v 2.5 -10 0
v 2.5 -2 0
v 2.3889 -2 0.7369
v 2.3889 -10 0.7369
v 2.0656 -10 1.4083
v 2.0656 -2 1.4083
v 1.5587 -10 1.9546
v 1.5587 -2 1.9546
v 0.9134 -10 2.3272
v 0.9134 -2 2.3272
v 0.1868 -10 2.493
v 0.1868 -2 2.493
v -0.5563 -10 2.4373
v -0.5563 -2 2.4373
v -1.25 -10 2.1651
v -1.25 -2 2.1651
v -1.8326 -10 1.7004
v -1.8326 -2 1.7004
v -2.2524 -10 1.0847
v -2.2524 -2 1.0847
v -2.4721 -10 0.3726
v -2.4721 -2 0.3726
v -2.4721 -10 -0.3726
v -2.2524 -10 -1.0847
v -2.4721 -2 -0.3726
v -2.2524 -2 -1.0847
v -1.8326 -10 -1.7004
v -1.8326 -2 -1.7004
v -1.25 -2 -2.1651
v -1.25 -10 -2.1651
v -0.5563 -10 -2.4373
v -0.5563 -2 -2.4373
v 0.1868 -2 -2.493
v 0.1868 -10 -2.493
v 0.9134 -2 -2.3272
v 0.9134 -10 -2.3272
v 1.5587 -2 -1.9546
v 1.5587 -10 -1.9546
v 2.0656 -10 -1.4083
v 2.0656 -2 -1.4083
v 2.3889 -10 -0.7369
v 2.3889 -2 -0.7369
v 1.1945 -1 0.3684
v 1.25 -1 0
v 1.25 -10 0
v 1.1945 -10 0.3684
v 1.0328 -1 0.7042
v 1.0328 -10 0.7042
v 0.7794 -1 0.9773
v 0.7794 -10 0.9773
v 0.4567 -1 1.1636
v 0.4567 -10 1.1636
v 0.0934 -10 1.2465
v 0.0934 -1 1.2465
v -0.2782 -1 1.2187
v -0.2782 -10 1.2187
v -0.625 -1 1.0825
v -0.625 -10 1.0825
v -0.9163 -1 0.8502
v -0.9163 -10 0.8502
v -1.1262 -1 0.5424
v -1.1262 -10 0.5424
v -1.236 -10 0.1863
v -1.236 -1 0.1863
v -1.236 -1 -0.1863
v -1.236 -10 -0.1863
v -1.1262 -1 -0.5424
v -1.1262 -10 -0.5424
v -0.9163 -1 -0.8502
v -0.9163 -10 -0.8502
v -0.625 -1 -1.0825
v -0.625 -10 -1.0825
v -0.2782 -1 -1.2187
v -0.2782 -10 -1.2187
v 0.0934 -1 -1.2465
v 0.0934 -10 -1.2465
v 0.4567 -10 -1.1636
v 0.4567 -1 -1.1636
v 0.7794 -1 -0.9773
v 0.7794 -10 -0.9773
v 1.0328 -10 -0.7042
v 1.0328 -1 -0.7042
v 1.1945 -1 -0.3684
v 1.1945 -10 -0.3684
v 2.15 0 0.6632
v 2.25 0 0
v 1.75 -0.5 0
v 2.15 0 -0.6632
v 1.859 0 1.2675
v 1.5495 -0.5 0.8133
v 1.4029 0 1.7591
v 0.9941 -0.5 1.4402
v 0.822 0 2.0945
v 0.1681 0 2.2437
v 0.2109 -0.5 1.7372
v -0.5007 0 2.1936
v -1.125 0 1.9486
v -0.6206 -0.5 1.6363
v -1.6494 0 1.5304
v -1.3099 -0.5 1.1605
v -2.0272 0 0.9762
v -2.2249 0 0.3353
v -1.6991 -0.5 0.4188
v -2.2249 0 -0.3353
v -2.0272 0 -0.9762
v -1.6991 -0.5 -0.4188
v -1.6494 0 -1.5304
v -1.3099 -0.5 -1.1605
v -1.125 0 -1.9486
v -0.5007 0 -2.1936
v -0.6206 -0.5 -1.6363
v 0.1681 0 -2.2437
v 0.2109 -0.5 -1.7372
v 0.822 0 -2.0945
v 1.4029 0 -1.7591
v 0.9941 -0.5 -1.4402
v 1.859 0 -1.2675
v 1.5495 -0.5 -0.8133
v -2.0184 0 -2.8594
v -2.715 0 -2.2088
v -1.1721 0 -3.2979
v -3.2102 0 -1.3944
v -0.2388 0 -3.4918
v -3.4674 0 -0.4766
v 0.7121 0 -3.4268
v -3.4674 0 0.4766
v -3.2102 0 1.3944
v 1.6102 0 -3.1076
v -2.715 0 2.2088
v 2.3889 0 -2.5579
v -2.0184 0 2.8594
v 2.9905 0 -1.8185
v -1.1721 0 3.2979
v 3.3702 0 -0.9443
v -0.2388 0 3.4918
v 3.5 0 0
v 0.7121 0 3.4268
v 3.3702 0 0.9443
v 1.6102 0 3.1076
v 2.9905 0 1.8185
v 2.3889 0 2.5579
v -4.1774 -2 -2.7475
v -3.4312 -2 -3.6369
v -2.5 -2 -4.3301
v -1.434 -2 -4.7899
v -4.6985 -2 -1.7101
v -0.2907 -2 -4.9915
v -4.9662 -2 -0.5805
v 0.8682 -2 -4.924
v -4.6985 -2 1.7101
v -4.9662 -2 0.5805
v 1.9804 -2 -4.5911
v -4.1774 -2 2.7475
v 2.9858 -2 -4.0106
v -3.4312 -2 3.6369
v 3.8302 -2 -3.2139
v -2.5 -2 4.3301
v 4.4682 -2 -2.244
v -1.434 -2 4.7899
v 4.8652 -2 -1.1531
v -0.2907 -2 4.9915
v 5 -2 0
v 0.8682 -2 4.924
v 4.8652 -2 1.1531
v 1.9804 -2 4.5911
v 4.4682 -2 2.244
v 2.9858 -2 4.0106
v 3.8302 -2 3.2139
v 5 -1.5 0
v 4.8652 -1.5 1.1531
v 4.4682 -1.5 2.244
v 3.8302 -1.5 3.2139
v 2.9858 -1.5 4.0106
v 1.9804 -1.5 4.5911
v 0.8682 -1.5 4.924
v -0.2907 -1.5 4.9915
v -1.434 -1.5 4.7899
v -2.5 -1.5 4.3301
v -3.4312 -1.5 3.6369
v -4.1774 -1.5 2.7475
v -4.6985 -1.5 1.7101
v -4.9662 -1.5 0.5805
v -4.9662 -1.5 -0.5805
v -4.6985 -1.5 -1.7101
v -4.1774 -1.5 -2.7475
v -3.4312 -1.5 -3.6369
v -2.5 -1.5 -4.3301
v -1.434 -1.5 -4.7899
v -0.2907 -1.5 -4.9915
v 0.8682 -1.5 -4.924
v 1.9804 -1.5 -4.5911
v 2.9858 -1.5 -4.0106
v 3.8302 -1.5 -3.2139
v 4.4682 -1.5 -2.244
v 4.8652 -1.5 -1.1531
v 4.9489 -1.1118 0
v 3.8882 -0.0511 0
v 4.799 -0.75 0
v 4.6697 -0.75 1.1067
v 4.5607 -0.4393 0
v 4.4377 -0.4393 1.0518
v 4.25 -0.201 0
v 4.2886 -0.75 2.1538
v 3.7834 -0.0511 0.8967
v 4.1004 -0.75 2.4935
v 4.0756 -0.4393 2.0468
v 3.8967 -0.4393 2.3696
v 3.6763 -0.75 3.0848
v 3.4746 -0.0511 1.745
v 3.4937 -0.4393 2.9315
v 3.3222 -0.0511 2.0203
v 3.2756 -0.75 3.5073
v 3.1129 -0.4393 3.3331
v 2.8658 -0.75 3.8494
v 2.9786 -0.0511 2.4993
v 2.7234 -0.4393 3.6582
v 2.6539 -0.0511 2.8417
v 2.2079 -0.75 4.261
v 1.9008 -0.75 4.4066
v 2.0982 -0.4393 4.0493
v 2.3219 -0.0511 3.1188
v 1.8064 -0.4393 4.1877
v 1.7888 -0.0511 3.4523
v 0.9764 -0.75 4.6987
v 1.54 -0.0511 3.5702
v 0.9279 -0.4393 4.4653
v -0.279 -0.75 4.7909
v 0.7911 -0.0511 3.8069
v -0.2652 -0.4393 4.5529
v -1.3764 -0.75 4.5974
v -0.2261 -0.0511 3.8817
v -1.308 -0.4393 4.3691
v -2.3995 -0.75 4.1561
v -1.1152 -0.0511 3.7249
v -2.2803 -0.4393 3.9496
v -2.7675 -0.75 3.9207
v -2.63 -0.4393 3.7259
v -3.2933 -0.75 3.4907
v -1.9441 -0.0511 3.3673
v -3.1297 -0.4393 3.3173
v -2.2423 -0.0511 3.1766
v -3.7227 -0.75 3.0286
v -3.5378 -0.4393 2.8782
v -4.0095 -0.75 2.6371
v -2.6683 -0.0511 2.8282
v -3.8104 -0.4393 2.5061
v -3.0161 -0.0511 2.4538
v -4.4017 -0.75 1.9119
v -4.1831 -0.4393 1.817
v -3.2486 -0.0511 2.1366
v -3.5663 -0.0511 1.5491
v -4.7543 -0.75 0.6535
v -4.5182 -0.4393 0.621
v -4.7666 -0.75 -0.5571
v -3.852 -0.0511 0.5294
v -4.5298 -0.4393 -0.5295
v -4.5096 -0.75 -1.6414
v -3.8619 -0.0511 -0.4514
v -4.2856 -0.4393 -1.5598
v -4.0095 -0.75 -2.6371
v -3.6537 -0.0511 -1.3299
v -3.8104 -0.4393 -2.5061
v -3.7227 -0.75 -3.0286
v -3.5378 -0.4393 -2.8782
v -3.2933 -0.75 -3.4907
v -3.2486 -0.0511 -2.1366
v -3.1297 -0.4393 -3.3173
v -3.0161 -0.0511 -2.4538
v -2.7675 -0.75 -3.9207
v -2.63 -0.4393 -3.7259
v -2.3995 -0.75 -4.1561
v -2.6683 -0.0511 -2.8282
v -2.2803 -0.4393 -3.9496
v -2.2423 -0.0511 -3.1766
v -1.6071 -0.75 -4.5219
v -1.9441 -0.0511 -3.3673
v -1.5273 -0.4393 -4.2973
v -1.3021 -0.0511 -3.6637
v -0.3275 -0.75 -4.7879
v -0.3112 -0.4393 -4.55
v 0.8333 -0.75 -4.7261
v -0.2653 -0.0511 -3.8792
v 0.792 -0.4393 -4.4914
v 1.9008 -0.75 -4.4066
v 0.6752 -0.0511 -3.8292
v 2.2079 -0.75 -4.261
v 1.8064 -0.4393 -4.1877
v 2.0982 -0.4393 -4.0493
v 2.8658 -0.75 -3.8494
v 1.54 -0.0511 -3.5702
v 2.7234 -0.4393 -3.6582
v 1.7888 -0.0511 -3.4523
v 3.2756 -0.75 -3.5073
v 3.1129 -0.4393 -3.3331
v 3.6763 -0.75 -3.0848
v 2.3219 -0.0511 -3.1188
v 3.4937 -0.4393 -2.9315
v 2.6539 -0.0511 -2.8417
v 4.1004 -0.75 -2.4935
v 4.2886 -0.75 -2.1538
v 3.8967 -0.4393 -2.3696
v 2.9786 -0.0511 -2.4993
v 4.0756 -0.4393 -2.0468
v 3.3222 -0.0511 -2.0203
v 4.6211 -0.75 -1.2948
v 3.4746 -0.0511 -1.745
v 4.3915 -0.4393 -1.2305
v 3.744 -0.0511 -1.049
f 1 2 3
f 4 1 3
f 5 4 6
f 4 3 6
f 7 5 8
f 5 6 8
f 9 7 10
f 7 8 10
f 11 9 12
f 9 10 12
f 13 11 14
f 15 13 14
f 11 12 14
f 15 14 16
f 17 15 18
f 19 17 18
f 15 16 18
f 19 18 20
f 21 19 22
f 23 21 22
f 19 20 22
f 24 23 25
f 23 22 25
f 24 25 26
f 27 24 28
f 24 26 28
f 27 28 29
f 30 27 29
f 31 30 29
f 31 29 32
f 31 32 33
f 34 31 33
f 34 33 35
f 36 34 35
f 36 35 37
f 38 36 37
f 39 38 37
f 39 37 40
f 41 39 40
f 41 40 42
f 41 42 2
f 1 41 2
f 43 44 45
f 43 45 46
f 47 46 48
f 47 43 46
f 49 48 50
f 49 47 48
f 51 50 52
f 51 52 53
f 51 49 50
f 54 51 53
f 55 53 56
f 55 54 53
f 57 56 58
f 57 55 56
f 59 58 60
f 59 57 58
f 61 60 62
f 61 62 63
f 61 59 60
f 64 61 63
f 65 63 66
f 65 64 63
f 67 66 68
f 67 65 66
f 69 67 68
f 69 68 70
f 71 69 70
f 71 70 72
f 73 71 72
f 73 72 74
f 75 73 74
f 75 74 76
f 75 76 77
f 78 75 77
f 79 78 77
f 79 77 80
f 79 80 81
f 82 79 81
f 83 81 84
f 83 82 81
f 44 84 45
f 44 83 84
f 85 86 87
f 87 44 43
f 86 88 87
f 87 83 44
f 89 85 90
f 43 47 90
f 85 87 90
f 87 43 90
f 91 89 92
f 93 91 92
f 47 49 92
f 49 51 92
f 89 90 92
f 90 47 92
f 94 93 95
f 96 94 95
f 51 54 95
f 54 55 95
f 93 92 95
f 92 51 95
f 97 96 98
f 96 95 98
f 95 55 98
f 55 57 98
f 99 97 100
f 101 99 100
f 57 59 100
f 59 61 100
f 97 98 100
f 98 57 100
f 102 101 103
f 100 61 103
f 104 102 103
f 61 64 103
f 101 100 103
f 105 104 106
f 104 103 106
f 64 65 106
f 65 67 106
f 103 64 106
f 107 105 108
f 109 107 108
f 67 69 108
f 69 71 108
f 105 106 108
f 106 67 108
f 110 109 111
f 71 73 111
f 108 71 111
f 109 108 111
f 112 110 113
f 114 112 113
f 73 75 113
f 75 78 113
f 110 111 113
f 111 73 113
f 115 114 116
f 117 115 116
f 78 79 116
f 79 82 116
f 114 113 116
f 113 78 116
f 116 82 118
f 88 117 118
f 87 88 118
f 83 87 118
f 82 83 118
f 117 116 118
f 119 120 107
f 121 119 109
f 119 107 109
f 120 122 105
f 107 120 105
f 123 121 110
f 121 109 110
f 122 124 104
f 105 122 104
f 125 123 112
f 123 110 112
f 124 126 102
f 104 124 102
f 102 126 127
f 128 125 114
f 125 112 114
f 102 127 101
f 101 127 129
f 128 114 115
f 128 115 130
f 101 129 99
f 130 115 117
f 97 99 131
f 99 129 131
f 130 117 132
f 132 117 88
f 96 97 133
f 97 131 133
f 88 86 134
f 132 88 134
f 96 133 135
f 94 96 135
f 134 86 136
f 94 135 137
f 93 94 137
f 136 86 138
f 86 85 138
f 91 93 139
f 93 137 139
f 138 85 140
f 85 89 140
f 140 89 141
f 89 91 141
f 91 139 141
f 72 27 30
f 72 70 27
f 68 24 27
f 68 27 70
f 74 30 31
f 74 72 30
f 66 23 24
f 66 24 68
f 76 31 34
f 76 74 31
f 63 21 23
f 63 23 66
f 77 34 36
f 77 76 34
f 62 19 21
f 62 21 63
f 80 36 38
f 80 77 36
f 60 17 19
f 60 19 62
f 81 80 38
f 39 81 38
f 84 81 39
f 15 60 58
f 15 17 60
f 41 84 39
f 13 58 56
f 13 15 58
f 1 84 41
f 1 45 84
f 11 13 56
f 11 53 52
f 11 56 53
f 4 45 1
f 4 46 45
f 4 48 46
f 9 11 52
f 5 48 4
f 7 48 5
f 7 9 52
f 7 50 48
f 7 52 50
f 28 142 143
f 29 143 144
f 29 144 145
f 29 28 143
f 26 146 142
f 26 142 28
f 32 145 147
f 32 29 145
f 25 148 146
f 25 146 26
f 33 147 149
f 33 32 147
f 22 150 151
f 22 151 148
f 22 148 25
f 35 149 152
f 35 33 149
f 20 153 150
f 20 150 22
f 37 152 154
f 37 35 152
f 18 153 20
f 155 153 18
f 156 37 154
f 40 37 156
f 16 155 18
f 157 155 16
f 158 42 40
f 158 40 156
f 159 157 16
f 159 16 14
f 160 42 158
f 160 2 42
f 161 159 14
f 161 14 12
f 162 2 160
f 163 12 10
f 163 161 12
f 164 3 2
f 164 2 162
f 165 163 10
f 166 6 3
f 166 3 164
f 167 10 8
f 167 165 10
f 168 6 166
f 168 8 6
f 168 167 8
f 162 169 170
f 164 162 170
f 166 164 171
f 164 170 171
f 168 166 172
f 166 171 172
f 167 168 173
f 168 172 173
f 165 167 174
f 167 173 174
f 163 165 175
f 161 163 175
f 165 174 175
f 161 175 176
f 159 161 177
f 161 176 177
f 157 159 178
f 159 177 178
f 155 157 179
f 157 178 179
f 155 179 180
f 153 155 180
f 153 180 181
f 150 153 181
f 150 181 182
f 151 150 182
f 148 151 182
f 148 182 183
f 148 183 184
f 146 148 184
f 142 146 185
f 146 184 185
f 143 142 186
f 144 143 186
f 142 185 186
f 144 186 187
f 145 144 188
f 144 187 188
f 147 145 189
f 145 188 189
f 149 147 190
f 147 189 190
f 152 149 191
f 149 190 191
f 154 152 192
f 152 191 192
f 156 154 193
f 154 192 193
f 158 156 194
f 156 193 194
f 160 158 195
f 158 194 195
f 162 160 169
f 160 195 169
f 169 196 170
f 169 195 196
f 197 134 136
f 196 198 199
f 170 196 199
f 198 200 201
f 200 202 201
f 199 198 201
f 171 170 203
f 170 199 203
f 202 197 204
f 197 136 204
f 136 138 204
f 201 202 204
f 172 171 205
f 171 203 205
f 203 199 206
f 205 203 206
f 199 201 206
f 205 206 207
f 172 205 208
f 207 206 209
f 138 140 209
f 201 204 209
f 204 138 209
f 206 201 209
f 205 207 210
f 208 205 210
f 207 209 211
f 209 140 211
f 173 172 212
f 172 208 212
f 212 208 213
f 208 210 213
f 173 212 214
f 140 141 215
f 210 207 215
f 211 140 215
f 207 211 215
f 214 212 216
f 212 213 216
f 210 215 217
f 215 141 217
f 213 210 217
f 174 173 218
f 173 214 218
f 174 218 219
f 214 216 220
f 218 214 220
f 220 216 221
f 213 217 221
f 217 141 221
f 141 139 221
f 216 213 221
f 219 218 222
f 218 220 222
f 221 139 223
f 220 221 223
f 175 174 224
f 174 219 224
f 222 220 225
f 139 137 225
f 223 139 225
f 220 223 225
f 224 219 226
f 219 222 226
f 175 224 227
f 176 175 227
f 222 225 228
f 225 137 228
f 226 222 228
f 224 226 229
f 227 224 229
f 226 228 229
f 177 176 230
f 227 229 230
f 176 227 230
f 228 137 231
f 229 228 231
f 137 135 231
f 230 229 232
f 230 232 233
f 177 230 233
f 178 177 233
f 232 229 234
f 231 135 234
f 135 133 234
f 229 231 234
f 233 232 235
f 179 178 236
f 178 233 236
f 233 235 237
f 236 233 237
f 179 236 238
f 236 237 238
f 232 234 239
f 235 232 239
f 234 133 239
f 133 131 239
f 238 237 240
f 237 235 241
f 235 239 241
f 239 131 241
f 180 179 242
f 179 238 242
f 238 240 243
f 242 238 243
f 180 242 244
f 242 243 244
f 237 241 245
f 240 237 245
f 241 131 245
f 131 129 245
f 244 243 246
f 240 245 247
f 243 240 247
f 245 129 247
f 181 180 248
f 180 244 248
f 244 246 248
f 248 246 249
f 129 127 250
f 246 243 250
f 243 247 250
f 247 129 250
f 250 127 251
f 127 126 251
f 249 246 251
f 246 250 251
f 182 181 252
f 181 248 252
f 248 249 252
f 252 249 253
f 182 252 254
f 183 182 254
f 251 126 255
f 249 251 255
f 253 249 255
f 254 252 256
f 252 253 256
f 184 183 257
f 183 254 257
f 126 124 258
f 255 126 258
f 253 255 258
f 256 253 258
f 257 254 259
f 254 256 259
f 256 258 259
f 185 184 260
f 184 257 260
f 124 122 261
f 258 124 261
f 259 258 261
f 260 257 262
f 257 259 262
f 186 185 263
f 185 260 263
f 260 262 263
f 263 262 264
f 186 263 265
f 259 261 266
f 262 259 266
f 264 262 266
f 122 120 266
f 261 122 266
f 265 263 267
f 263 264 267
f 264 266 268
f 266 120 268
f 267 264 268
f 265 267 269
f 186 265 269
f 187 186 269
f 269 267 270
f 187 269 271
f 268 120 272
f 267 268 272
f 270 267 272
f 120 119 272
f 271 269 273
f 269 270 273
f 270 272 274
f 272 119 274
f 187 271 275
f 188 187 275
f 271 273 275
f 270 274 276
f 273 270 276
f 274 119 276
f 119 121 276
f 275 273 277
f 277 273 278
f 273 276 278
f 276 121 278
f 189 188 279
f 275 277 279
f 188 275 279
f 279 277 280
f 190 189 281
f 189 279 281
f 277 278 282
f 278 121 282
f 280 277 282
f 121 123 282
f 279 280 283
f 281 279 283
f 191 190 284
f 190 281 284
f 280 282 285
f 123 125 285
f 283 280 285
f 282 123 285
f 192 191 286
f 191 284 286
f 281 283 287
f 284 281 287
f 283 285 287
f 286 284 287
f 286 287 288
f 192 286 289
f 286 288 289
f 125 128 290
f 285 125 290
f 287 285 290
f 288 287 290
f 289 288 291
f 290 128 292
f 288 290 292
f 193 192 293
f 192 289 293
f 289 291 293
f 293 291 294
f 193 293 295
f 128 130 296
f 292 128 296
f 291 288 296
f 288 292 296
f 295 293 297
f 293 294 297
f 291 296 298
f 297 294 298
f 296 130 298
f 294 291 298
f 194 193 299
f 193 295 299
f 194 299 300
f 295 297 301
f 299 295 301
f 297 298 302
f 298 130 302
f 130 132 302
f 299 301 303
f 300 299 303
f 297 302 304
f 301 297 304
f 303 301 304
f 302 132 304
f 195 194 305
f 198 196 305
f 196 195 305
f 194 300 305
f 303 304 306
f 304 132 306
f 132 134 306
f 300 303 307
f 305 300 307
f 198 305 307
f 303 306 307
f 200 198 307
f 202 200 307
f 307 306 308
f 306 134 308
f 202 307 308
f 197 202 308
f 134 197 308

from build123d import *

# Parameters (mm, degrees)
F0_R     = 2.5
F0_R_2   = 1.25
F1_DEPTH = 10
F0_R_3   = 5
F2_DEPTH = 2
F3_R     = 1.5
F4_SIZE  = 1


with BuildPart() as f1:
    # F0 (on Front) → F1 (new body)
    with BuildSketch(Plane.XZ):
        Circle(F0_R)
        Circle(F0_R_2, mode=Mode.SUBTRACT)
    extrude(amount=F1_DEPTH)

    # F0 (on Front) → F2 (join)
    with BuildSketch(Plane.XZ):
        Circle(F0_R_3)
        Circle(F0_R, mode=Mode.SUBTRACT)
    extrude(amount=F2_DEPTH)

    # F3
    f3_edges = [f1.edges().sort_by_distance(p)[0] for p in [
        (-5, 0, 0),
    ]]
    fillet(f3_edges, radius=F3_R)

    # F4
    f4_edges = [f1.edges().sort_by_distance(p)[0] for p in [
        (-1.25, 0, 0),
    ]]
    chamfer(f4_edges, length=F4_SIZE)


solid = f1.part
